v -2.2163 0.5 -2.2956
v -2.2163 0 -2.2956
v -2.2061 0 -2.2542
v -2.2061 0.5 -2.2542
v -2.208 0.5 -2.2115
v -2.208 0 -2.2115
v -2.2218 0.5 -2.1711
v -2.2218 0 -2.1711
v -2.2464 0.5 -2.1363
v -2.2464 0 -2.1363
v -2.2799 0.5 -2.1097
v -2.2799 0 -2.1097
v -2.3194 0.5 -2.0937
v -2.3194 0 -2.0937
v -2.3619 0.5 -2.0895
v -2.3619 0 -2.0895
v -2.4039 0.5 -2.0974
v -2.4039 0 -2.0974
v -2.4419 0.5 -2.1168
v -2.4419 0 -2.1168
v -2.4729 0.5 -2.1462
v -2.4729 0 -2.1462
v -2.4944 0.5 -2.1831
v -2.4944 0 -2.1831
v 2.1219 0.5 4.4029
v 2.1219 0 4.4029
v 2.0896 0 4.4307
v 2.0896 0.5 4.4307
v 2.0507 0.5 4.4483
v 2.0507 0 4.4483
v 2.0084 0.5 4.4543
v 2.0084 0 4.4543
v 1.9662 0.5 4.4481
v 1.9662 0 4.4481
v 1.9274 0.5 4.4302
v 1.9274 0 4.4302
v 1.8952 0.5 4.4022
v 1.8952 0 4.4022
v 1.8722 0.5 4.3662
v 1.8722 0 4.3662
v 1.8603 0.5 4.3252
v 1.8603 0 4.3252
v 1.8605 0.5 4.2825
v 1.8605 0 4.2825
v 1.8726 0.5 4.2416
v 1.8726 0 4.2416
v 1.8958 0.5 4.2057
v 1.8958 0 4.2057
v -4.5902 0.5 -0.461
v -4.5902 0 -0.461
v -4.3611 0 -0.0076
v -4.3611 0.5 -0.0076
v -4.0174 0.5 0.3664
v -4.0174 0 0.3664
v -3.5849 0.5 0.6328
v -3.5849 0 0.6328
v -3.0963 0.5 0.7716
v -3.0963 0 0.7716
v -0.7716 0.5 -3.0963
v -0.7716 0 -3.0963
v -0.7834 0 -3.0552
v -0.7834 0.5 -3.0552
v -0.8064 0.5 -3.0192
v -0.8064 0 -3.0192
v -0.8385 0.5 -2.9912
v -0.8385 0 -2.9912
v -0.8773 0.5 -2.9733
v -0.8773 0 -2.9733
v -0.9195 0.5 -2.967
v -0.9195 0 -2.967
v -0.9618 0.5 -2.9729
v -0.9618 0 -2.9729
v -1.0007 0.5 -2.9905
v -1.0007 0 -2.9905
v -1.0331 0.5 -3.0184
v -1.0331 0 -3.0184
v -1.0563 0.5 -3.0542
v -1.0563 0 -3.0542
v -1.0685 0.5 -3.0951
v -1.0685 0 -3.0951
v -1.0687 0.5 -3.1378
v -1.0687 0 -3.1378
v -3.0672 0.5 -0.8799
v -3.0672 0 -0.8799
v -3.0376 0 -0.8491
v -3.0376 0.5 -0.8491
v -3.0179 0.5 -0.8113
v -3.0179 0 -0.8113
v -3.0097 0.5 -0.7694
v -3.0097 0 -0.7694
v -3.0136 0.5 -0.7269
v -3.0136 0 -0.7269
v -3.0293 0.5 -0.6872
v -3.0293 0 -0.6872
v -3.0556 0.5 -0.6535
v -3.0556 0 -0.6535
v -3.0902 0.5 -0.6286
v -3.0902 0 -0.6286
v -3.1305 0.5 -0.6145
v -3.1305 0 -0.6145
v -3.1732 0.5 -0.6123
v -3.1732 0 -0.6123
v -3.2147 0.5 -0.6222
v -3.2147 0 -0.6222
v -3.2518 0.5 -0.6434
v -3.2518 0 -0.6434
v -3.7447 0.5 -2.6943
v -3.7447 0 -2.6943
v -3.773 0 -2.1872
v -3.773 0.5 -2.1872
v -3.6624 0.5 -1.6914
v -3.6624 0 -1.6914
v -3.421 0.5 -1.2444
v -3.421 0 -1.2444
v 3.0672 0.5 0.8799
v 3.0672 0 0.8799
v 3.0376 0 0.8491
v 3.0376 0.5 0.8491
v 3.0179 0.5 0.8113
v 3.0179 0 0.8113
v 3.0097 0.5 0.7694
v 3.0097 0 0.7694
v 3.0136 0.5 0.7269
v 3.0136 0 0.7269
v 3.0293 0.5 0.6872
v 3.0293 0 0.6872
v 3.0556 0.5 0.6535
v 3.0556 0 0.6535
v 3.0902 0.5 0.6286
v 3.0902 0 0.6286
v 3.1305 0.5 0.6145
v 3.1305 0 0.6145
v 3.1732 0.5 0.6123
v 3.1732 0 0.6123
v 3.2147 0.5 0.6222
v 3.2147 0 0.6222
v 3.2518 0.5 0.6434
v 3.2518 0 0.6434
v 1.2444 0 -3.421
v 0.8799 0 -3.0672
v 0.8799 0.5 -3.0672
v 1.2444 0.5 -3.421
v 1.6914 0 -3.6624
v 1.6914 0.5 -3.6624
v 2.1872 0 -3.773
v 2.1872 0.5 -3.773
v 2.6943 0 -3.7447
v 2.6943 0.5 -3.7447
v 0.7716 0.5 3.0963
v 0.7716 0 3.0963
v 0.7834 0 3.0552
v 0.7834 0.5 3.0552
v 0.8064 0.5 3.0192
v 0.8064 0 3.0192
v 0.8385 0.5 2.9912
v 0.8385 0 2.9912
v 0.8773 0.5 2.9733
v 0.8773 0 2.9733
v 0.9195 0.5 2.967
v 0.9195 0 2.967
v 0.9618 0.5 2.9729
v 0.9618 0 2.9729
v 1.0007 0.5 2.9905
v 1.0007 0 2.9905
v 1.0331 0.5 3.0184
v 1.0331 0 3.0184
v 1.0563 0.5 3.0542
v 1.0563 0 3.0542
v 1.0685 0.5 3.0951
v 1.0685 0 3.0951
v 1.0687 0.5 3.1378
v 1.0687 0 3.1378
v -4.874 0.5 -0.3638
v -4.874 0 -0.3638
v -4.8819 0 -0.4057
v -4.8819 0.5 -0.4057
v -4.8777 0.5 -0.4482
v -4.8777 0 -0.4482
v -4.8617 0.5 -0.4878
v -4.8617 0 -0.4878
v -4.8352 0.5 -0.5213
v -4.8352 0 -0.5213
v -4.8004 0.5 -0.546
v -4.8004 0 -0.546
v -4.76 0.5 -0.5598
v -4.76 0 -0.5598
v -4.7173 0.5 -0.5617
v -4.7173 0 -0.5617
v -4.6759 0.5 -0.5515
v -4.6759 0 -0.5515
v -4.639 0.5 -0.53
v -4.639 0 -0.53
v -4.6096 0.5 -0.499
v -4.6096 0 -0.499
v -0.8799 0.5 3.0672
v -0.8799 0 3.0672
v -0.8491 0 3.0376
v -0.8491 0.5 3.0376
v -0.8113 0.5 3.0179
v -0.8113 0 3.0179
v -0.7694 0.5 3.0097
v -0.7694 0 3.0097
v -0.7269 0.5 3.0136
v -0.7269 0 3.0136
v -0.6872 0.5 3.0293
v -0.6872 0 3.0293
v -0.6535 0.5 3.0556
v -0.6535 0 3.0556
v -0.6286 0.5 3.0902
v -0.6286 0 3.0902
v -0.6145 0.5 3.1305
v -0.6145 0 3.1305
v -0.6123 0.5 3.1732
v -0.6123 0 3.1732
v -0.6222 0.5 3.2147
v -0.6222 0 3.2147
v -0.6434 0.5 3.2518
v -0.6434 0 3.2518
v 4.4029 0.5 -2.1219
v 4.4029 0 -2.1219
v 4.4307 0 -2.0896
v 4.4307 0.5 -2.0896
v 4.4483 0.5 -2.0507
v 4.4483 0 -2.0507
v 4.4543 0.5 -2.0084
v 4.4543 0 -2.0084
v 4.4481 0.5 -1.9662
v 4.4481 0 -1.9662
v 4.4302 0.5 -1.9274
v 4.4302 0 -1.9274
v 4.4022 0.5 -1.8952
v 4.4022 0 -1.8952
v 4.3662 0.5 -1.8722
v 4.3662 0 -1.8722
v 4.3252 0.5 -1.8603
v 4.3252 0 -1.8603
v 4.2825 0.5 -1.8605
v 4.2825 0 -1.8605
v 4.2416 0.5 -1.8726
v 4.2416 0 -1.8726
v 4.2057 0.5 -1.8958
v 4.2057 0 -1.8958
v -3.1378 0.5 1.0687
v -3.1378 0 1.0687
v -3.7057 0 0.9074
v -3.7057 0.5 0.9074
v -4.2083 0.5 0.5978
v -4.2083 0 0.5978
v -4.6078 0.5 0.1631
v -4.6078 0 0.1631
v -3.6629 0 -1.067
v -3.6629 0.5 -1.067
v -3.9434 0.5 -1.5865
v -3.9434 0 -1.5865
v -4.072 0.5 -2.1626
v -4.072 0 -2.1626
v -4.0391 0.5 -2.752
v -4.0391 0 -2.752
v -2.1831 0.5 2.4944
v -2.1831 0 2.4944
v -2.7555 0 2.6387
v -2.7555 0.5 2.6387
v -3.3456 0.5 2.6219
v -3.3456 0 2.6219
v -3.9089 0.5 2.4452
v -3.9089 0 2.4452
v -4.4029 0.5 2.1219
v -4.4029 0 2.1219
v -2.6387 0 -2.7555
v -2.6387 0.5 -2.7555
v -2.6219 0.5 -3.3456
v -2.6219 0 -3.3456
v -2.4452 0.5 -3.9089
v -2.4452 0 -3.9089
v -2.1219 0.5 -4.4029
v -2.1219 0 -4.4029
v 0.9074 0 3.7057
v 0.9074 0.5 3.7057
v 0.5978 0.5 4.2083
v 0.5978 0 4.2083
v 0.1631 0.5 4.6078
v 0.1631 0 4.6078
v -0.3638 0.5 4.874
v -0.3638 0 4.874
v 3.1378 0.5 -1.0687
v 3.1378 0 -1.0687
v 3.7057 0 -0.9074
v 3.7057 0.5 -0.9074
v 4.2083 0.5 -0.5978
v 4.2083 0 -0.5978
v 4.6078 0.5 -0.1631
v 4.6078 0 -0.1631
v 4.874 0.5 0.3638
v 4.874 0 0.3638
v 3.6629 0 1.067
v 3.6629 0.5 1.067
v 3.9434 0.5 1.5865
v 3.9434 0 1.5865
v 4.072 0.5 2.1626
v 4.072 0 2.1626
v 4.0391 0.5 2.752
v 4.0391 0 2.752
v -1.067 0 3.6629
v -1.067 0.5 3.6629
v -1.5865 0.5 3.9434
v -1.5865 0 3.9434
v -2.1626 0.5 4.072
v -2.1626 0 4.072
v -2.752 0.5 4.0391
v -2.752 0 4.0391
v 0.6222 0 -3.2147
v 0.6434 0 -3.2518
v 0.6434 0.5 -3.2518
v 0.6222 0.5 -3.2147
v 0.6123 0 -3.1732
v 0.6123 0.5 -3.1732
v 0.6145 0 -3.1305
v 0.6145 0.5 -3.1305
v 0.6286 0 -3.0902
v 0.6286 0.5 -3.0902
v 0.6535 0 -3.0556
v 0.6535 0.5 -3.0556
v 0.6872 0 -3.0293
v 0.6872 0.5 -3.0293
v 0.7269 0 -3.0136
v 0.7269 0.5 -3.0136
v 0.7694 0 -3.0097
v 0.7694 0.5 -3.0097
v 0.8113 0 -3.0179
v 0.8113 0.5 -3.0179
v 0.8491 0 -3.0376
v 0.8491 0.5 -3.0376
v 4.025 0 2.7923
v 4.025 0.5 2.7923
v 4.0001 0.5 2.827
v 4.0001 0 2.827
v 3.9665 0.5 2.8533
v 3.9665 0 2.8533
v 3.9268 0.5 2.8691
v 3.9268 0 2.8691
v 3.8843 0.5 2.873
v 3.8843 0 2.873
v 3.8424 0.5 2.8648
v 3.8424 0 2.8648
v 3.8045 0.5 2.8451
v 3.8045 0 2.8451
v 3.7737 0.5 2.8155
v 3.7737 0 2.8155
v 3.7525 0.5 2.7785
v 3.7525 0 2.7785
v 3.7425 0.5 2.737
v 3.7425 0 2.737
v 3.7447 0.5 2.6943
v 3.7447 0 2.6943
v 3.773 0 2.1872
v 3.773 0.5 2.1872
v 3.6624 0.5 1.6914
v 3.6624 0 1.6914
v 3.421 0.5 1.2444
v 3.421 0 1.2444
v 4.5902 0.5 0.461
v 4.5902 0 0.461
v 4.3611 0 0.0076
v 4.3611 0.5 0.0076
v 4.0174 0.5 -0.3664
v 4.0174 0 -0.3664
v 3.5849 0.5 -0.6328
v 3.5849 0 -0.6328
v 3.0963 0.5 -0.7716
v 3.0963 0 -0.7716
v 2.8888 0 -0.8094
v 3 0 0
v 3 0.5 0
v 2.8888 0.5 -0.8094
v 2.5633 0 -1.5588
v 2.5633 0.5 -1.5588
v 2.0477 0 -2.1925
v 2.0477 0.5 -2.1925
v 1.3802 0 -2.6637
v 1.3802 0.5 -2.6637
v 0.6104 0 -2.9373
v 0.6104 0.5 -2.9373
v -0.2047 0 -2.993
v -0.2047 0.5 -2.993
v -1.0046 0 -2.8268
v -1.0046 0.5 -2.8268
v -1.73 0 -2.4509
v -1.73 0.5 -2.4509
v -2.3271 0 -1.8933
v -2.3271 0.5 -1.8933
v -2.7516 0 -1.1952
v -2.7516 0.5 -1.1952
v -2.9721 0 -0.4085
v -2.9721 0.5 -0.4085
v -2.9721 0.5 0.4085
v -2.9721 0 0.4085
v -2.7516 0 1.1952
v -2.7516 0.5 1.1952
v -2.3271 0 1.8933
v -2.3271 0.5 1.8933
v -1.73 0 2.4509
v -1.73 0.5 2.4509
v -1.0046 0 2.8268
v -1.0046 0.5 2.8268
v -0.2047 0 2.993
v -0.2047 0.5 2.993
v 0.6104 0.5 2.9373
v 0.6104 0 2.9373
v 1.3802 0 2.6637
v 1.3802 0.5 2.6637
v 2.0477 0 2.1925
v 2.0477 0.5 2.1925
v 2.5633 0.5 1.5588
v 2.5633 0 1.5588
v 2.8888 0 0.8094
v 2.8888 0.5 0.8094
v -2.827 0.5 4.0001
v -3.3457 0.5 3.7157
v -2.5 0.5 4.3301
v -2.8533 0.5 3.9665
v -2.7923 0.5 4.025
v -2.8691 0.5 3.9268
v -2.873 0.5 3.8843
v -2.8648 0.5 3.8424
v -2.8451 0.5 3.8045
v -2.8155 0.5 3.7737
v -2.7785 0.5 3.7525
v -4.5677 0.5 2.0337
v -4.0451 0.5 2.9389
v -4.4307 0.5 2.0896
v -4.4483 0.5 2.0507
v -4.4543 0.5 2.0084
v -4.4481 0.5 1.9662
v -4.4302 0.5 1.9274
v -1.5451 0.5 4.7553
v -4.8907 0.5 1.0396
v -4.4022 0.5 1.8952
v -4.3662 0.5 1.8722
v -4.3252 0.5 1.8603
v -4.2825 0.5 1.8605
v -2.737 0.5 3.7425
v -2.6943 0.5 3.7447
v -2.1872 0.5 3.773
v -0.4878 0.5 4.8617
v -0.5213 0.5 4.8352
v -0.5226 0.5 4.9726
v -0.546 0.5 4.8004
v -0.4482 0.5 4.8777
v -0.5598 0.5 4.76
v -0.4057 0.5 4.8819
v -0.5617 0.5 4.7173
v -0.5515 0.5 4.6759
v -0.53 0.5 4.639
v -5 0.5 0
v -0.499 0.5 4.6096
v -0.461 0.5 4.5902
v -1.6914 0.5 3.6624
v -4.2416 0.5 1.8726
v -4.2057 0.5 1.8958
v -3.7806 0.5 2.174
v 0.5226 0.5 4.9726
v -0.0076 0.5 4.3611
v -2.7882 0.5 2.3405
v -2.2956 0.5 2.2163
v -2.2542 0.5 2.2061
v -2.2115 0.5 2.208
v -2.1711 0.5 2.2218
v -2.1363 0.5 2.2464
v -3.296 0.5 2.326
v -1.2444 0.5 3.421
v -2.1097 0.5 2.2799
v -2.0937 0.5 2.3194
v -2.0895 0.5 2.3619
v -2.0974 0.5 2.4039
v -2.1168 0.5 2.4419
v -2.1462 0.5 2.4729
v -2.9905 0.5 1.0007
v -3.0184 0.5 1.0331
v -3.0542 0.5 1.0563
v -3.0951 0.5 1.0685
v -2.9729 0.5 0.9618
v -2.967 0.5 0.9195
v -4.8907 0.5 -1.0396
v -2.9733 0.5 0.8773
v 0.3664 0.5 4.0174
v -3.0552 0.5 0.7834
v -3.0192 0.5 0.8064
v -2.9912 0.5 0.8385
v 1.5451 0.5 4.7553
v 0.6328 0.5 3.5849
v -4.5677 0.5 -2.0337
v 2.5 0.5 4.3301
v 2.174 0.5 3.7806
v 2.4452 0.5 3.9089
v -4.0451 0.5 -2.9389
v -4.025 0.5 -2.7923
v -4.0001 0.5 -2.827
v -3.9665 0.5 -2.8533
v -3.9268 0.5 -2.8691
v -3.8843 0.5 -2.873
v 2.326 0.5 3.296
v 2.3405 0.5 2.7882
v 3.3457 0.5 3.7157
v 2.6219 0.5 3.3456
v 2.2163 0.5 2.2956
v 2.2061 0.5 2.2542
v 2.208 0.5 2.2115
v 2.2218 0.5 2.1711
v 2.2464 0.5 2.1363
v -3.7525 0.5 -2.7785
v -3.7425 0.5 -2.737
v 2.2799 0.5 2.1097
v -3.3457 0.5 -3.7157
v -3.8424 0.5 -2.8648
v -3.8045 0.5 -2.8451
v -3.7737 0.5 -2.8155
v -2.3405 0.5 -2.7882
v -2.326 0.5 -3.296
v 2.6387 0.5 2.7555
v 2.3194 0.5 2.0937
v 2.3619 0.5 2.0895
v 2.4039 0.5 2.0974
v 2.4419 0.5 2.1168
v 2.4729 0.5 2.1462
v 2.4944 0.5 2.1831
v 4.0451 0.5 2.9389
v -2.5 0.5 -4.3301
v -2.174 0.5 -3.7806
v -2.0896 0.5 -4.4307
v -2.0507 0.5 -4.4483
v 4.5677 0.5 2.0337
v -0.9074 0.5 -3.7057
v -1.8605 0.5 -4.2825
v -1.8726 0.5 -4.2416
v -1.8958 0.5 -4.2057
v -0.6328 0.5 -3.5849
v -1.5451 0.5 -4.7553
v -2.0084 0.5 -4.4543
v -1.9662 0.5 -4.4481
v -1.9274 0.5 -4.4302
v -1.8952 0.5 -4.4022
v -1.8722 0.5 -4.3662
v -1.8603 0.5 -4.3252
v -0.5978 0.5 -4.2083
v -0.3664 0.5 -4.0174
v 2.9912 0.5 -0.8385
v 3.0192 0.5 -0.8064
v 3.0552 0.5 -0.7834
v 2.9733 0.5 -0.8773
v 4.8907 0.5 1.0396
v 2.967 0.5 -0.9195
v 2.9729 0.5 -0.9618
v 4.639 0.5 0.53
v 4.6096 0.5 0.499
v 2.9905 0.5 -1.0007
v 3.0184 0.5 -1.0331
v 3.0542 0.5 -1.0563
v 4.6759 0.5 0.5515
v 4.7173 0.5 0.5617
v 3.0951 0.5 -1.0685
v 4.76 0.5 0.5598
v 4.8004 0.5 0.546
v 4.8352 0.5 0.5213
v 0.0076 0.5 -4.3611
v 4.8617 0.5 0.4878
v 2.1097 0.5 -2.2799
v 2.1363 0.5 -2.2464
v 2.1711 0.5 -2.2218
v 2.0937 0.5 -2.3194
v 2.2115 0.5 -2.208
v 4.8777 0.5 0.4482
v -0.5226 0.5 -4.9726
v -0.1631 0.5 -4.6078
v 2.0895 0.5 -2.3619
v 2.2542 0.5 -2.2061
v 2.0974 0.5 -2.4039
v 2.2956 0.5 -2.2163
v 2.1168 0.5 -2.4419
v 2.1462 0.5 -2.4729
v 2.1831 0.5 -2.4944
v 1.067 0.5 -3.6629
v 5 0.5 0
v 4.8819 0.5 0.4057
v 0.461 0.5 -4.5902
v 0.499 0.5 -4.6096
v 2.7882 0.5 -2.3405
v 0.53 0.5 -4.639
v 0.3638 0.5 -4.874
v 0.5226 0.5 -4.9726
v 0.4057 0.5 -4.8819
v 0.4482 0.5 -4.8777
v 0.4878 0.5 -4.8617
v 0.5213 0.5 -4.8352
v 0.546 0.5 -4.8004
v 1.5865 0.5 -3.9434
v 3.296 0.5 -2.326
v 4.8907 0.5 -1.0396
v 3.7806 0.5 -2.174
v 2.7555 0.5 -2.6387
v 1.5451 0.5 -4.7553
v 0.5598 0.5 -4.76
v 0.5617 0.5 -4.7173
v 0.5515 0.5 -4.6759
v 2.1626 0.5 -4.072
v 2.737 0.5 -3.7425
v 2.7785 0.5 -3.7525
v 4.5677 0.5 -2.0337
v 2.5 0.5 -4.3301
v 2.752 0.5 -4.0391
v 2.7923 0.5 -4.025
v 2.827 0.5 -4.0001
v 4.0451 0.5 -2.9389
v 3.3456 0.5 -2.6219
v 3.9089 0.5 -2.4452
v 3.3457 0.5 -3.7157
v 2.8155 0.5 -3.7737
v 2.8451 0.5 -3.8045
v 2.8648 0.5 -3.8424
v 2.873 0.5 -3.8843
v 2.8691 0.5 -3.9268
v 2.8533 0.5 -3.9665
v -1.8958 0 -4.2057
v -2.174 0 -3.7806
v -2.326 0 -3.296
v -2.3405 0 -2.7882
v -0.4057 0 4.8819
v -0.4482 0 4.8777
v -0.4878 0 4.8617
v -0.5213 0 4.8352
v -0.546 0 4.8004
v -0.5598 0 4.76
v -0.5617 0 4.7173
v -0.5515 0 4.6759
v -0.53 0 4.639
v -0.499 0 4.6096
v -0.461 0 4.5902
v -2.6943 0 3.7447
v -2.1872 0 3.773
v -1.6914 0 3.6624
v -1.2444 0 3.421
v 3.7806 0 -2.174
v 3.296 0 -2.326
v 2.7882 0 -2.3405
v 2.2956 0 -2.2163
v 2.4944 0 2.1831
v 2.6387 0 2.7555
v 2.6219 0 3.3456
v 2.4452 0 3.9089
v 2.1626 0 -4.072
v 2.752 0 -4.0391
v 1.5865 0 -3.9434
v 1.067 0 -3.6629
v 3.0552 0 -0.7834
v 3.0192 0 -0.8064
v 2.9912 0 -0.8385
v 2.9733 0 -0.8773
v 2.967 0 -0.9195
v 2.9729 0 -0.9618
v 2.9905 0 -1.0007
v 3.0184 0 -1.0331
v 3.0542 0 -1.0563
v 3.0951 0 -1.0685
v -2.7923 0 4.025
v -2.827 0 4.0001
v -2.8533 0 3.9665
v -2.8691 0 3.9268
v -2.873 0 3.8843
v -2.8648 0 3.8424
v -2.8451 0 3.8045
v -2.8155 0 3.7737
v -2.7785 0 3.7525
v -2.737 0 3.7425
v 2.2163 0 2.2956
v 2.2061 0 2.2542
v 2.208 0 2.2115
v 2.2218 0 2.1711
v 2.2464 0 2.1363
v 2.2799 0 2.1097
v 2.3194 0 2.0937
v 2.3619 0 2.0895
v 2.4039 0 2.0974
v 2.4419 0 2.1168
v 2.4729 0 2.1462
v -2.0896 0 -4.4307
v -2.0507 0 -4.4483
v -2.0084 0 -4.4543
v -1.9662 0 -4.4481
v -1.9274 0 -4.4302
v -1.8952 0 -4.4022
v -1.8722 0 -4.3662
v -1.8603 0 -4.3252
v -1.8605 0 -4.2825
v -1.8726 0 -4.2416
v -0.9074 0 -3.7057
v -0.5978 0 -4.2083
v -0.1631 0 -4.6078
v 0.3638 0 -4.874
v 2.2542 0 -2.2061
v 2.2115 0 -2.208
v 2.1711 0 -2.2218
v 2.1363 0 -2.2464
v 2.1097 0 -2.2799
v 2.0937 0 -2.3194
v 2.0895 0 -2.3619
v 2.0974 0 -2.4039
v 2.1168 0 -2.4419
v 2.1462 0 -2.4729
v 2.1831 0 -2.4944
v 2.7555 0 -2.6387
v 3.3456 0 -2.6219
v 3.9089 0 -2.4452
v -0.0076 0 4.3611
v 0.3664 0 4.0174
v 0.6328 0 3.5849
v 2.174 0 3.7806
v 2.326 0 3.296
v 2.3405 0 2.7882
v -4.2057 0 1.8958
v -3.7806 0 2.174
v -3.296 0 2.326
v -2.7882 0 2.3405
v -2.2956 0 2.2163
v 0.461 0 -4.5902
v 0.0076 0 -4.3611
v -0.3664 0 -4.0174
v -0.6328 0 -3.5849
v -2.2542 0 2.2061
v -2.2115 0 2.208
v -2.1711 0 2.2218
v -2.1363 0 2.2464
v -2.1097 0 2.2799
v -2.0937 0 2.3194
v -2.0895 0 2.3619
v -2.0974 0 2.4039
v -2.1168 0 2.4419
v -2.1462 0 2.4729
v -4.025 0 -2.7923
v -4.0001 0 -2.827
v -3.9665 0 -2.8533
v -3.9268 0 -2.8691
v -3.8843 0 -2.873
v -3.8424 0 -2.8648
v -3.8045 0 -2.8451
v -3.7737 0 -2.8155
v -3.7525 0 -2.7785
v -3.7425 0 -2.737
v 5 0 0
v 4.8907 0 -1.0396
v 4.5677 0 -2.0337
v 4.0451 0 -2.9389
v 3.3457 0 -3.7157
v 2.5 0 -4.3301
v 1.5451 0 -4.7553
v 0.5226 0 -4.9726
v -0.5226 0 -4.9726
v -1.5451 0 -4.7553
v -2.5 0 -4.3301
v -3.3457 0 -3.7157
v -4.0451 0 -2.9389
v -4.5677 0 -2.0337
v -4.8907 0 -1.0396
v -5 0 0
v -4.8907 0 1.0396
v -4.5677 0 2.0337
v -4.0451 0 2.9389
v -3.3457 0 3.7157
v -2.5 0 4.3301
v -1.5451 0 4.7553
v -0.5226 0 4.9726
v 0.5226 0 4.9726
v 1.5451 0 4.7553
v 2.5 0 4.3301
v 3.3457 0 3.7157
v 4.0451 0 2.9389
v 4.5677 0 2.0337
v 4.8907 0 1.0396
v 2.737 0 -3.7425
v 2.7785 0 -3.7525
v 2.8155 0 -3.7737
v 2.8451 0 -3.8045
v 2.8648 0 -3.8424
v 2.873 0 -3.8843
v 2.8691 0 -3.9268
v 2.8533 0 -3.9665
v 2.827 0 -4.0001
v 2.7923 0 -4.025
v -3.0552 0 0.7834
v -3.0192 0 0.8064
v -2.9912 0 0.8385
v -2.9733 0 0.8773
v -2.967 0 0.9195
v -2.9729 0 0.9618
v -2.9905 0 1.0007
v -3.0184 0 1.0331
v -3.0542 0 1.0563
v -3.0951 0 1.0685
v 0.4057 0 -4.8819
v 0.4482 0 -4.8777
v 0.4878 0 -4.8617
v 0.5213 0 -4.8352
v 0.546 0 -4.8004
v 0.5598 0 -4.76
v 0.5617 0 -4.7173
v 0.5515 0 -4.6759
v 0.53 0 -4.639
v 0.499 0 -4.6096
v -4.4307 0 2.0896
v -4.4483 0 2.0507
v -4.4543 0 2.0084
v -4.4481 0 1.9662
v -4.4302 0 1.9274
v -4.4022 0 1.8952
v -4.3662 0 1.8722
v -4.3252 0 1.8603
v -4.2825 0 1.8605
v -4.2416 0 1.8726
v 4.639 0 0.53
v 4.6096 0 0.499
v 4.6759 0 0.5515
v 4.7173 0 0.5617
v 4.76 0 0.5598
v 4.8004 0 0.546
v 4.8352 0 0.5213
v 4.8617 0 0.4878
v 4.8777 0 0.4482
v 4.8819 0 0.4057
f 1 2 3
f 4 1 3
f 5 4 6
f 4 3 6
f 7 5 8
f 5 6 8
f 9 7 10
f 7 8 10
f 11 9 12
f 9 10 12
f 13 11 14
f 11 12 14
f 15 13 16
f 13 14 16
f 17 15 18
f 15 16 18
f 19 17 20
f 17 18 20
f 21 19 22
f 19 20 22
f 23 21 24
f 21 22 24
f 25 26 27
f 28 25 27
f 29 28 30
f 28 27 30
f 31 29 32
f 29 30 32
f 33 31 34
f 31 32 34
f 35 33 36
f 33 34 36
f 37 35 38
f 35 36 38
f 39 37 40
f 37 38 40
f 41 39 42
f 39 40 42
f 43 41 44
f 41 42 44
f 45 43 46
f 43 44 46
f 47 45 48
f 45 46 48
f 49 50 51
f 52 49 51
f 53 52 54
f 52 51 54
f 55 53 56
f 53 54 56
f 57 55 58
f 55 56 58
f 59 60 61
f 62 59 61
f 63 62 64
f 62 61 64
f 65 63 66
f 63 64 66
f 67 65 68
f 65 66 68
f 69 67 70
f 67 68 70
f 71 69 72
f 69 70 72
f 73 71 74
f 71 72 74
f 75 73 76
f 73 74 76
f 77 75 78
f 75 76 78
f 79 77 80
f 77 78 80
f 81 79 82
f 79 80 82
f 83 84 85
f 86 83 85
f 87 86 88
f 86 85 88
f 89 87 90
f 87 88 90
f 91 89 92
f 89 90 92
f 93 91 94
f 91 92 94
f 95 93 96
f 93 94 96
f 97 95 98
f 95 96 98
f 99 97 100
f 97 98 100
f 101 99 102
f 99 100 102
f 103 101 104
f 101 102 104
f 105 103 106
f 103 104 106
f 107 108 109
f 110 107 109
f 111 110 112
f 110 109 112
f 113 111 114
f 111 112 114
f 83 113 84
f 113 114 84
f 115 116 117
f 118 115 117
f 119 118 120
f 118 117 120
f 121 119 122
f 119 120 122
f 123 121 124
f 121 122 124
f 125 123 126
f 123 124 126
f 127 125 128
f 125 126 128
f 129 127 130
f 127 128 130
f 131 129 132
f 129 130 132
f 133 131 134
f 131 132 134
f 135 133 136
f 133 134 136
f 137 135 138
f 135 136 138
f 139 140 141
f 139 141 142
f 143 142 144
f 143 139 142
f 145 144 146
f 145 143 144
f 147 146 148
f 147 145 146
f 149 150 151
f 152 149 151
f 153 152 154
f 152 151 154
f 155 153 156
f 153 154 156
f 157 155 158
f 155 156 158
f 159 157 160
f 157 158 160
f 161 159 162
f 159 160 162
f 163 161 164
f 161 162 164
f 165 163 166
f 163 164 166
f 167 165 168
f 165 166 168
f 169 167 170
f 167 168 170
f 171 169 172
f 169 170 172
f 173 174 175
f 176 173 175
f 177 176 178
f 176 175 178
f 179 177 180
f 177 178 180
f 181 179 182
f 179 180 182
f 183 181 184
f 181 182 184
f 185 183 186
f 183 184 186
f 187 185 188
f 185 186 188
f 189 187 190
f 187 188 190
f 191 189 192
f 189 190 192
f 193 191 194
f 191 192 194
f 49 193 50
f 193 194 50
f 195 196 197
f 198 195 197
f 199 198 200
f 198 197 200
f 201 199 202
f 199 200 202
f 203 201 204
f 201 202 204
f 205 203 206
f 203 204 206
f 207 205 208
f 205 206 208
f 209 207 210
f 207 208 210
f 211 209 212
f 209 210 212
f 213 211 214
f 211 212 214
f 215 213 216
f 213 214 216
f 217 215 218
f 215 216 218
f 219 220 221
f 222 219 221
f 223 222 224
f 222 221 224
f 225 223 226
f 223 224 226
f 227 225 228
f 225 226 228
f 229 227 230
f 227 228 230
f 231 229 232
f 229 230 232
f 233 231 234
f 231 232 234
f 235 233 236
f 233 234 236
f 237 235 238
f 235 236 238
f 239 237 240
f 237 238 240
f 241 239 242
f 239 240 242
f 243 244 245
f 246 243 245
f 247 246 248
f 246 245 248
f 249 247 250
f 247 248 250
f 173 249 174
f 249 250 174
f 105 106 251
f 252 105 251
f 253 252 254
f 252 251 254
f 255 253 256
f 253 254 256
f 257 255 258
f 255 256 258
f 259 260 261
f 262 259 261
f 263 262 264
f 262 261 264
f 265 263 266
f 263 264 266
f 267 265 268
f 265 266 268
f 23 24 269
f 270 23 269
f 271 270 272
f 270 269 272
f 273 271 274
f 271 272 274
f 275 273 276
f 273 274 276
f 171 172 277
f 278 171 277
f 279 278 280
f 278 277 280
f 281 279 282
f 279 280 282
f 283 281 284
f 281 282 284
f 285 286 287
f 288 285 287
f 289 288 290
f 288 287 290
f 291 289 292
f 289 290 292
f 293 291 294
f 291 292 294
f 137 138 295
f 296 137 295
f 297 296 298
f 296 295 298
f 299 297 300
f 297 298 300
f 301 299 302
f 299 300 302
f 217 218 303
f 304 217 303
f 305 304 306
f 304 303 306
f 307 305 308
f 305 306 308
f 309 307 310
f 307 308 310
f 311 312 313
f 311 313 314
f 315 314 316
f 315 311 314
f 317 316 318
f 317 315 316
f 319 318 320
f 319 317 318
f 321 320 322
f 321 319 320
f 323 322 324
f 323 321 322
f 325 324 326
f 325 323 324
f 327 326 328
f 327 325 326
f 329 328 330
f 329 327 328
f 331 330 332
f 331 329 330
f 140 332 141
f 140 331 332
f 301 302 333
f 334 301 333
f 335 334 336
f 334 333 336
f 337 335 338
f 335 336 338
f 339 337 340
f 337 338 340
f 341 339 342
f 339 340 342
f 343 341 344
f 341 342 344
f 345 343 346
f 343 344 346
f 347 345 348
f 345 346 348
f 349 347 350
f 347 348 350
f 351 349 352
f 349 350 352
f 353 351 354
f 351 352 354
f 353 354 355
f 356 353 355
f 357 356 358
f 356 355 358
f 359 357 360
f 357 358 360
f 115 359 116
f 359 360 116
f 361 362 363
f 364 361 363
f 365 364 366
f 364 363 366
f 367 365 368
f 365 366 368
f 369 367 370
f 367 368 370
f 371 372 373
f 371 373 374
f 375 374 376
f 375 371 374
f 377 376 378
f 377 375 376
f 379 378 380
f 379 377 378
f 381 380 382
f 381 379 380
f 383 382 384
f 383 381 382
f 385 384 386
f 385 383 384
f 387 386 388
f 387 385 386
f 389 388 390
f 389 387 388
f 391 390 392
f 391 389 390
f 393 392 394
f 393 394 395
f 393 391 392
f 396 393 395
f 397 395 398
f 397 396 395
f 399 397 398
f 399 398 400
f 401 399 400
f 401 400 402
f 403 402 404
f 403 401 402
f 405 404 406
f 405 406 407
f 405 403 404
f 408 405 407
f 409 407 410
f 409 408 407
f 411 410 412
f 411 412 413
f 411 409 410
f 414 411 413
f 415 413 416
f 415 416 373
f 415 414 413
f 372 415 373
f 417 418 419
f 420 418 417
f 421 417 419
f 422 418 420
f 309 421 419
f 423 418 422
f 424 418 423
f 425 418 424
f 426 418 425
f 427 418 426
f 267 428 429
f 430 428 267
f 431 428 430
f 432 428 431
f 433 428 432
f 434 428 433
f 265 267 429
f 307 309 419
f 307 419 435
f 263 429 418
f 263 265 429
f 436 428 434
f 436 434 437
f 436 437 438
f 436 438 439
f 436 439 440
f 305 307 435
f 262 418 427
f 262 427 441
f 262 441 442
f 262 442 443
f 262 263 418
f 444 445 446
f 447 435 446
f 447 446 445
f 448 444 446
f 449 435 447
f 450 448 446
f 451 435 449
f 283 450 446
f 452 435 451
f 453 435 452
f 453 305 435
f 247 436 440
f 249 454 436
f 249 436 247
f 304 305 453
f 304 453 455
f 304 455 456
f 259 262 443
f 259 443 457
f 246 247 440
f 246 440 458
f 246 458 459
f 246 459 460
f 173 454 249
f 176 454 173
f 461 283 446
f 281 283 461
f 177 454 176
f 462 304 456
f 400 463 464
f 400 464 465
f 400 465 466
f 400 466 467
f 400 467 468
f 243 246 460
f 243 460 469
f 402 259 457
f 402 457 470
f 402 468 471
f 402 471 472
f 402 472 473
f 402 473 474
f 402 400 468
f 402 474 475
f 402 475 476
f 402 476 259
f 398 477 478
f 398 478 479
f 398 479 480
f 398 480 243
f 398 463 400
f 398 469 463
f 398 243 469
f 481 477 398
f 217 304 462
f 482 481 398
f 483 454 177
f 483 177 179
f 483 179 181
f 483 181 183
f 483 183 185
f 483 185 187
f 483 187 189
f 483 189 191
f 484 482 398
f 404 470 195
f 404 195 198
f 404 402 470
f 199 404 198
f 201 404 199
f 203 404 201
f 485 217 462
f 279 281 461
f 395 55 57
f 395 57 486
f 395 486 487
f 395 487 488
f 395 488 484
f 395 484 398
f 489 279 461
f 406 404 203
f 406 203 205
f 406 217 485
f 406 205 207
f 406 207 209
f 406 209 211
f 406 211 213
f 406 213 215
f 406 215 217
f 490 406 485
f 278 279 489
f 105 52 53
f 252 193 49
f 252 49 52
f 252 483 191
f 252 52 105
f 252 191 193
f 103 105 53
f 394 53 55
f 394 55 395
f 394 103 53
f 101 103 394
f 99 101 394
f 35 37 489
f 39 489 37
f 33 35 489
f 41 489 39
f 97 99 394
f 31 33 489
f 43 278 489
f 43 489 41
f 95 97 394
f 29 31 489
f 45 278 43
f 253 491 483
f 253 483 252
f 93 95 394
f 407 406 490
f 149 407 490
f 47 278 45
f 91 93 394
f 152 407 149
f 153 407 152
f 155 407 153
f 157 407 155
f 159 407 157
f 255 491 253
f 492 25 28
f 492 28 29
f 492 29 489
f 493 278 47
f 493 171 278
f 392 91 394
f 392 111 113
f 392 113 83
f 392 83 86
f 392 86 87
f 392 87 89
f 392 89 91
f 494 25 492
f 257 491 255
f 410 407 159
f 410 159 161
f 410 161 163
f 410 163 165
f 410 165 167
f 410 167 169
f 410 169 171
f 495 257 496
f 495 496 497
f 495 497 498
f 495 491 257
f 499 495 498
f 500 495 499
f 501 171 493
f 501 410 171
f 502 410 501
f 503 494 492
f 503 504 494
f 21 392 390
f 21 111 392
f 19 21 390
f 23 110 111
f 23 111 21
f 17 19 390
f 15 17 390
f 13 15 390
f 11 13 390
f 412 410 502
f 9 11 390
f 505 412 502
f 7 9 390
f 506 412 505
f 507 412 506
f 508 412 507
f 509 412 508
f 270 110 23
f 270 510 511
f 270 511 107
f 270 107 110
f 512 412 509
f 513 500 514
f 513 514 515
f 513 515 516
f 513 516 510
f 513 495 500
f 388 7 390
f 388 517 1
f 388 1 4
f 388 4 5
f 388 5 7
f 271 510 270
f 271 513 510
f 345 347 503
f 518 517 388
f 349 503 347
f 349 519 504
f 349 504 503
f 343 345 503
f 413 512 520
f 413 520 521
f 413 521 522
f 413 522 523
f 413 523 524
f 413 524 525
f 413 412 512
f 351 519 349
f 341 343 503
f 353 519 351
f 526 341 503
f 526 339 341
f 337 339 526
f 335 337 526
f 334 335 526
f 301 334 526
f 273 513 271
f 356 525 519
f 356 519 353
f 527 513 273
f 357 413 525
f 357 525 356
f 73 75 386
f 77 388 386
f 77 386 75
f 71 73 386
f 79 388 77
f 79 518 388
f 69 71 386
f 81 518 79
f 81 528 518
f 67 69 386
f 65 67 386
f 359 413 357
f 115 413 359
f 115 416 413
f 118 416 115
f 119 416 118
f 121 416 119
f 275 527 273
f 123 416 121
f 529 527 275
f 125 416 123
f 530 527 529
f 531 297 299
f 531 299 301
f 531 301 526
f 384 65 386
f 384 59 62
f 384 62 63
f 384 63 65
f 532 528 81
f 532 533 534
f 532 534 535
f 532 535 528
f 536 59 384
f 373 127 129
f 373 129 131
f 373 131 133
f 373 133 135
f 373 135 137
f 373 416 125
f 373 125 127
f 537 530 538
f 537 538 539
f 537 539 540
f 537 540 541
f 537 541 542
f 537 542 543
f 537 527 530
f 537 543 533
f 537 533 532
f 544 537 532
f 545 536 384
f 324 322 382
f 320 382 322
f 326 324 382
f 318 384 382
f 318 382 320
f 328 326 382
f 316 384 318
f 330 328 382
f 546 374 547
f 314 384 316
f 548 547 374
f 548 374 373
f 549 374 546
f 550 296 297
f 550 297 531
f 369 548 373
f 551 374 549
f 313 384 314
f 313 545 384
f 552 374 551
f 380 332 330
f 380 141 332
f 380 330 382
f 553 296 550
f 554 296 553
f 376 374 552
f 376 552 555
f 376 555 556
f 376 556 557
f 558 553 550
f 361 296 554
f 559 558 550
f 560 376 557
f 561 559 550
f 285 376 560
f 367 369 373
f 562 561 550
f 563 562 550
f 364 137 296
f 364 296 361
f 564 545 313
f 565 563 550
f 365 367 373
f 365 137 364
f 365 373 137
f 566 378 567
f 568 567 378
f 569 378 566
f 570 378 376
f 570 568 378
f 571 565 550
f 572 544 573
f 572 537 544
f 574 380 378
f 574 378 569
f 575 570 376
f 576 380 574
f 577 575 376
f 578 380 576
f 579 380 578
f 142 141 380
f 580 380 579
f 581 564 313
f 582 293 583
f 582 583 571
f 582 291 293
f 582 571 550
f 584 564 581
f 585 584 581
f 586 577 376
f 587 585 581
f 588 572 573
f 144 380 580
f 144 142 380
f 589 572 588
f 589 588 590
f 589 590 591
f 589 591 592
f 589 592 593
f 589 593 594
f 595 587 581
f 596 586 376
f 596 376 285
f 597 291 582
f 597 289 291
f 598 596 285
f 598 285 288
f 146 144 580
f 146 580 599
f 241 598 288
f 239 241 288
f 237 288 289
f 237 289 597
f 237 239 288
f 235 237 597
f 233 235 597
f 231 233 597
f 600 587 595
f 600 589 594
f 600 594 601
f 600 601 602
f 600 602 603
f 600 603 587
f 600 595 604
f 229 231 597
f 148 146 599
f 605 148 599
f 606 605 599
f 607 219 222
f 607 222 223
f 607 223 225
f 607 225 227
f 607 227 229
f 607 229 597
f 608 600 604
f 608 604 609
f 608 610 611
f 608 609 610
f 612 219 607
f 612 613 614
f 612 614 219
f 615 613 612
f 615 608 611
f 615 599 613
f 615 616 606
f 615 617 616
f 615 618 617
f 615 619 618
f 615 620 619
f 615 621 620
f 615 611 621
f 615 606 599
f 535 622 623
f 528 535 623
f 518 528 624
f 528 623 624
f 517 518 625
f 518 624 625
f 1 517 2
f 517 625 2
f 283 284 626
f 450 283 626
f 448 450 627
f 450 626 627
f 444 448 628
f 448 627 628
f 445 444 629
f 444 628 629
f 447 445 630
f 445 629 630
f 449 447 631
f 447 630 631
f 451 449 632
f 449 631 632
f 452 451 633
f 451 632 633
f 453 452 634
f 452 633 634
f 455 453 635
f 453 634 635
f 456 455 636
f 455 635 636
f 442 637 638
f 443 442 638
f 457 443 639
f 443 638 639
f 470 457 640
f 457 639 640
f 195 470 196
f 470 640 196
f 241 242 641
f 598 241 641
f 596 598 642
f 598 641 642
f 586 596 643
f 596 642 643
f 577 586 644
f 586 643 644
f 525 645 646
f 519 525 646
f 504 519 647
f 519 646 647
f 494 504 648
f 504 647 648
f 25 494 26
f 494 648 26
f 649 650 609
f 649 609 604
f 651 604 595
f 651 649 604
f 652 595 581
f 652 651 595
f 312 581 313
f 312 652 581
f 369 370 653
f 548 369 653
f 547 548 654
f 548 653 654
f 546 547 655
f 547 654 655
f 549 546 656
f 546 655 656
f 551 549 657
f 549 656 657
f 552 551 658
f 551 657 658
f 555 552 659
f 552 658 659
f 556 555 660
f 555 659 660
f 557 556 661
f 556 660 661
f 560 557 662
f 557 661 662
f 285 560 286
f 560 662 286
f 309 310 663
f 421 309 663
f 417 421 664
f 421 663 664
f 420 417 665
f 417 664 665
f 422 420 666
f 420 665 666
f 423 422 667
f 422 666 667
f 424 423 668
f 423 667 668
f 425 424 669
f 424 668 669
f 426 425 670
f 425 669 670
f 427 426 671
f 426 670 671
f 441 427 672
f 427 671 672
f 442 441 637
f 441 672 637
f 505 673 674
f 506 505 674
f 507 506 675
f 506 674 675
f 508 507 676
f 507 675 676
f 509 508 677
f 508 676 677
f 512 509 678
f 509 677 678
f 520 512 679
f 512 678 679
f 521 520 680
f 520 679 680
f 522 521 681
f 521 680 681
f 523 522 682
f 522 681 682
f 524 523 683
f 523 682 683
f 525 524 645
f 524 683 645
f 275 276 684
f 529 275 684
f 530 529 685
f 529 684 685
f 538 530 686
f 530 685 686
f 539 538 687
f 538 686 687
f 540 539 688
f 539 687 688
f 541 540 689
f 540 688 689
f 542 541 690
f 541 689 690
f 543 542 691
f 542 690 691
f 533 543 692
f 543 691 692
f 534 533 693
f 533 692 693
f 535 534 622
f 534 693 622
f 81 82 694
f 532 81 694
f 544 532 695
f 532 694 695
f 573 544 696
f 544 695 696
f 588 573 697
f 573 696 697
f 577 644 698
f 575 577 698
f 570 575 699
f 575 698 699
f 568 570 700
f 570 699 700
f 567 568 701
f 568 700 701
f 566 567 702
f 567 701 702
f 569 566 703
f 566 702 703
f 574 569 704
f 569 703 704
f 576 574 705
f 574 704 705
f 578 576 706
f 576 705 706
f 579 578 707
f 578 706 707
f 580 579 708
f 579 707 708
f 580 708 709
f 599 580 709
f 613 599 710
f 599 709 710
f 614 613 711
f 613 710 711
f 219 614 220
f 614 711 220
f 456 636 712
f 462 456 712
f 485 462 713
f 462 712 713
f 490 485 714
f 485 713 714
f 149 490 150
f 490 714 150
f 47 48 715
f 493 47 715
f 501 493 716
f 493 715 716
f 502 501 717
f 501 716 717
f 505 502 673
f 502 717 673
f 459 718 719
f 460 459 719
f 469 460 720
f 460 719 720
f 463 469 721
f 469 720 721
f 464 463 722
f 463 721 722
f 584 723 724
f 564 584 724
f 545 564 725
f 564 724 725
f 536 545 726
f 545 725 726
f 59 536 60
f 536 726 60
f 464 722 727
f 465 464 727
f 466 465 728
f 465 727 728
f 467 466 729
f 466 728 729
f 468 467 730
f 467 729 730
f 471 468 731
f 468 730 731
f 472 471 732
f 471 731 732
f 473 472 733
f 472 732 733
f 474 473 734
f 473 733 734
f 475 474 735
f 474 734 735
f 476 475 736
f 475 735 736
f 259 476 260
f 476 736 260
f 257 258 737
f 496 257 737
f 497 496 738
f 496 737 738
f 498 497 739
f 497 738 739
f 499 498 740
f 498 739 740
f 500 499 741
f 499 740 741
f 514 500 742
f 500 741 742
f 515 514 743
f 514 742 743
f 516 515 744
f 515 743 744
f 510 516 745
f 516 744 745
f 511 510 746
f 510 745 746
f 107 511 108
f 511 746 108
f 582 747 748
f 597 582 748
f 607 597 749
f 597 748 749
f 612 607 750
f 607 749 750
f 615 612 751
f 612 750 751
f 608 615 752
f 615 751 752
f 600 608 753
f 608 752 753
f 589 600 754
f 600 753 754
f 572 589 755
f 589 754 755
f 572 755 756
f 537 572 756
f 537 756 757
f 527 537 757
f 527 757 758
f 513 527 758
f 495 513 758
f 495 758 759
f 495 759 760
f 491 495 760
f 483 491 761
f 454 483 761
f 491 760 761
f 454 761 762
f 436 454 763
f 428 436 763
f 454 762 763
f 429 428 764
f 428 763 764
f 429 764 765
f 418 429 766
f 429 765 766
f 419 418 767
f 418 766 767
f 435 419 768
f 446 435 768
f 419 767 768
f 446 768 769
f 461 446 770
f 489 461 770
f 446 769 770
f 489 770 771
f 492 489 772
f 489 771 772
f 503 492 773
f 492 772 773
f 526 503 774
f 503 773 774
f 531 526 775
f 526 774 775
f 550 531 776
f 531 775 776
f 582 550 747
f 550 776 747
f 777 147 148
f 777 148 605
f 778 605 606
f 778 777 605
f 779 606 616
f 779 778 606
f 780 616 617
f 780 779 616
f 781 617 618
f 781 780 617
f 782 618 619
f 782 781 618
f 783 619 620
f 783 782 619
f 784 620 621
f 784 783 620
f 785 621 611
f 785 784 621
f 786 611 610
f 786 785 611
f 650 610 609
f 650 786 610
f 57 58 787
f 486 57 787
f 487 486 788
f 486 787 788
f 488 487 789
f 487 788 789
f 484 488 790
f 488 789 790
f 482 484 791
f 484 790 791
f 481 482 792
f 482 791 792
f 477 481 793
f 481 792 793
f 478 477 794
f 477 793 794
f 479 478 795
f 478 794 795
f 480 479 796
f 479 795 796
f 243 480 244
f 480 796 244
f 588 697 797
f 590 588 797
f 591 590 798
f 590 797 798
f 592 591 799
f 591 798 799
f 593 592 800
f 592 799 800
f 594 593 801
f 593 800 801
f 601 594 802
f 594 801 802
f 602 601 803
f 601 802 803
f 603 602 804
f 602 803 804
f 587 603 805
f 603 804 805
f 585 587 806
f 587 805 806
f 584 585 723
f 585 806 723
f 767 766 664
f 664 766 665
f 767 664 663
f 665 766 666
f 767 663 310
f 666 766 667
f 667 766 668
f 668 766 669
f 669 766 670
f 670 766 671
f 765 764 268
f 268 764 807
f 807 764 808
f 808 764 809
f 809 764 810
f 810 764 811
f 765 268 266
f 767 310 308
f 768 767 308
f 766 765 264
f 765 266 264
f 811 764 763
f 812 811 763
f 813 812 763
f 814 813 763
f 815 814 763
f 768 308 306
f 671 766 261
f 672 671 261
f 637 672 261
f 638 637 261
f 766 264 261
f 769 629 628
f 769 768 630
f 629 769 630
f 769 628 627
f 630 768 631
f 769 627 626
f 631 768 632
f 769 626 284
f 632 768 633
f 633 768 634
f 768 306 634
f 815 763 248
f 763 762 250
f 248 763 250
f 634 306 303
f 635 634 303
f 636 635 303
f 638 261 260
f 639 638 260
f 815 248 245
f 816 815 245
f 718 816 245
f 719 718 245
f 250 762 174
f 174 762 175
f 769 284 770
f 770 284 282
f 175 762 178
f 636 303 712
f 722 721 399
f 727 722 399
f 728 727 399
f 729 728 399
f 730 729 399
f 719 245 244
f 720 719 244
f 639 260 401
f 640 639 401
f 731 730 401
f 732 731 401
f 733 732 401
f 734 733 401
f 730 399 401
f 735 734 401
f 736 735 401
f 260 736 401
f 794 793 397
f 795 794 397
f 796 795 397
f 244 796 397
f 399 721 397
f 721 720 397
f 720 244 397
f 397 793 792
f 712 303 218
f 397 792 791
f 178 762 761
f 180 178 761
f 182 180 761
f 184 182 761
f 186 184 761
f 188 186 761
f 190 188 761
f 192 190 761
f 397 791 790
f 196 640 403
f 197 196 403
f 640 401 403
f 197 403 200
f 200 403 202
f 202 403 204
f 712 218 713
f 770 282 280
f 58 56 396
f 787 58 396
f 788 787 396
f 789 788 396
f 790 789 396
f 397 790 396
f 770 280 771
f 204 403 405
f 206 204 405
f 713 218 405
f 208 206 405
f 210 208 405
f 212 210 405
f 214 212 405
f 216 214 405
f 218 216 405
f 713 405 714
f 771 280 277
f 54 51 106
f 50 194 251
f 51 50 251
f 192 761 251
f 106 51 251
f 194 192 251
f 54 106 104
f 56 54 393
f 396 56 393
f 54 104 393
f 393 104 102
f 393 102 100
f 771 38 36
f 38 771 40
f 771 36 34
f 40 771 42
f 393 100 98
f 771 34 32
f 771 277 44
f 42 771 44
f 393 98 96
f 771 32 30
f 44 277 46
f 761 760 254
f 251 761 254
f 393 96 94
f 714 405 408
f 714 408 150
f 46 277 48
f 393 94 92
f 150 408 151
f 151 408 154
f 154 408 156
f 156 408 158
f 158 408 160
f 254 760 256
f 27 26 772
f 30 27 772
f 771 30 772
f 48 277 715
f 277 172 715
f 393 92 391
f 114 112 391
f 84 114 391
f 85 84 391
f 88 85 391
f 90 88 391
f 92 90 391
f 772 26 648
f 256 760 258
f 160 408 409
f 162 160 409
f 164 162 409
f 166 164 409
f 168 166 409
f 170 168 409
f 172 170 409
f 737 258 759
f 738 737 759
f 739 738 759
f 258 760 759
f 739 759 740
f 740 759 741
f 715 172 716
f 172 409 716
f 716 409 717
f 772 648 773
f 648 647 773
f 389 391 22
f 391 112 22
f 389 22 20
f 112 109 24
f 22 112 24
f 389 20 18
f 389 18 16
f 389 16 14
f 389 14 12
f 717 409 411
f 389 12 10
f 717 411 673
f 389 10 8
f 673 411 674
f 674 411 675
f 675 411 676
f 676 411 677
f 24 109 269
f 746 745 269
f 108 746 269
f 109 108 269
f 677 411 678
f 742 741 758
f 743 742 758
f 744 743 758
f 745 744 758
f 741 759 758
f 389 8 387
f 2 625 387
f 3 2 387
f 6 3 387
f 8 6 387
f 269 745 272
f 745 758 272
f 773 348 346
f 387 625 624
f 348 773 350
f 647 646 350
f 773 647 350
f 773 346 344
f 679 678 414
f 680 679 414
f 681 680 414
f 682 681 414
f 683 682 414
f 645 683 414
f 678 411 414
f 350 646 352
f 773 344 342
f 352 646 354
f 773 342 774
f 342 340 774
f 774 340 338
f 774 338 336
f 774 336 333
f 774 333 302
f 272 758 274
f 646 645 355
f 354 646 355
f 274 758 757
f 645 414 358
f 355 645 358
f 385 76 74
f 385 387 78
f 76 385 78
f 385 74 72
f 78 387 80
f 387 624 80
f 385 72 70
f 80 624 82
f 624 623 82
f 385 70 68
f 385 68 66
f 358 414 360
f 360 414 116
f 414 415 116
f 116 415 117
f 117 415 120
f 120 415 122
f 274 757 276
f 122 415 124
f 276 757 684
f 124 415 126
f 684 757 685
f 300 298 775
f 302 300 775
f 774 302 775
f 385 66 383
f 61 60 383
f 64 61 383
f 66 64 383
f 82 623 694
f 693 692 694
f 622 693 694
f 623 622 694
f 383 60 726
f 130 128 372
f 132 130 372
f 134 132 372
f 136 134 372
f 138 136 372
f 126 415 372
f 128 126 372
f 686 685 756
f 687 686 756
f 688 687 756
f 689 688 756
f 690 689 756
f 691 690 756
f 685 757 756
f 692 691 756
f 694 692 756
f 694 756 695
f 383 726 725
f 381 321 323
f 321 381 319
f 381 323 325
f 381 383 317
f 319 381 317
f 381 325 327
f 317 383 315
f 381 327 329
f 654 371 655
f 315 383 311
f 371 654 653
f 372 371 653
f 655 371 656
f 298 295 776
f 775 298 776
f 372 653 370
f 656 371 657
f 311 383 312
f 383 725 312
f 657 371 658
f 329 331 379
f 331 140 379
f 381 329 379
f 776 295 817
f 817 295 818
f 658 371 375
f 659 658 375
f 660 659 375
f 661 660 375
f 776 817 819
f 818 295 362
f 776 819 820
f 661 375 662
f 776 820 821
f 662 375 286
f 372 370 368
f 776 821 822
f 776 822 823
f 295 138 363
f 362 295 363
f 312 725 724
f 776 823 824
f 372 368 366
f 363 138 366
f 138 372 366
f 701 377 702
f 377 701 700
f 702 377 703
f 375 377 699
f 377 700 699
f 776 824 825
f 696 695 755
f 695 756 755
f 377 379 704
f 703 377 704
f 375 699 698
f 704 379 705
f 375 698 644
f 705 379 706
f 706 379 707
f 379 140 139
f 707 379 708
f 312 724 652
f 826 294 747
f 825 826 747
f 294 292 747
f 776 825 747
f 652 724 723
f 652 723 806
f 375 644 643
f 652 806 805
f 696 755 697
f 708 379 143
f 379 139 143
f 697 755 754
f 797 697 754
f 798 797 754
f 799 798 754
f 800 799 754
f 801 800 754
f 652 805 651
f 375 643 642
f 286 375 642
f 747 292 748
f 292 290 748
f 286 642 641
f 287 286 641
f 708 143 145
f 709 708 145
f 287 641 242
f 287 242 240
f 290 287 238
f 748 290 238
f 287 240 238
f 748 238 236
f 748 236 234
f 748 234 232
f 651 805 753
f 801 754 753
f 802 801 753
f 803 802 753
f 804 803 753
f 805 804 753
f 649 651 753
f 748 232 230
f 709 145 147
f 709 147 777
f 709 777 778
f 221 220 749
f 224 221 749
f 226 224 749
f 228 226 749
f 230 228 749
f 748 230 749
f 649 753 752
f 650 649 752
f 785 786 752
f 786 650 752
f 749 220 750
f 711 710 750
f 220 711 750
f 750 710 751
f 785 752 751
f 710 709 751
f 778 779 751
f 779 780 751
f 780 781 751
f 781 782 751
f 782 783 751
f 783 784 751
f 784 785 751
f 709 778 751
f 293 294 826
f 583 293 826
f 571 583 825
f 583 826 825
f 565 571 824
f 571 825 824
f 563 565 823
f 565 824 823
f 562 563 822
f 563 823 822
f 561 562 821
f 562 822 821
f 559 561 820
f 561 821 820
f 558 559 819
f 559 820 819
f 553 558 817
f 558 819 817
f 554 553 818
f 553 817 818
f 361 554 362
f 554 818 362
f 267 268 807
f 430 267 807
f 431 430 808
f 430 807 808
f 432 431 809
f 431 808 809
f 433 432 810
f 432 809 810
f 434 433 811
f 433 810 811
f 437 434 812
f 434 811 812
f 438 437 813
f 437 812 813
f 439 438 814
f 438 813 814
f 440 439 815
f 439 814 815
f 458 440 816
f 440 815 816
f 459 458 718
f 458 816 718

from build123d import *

# Parameters (mm, degrees)
SKETCH1_R           = 5
SKETCH1_R_2         = 3
BOSS_EXTRUDE1_DEPTH = 0.5
CUT_EXTRUDE2_DEPTH  = 0.5
CUT_EXTRUDE3_DEPTH  = 0.5
CUT_EXTRUDE5_DEPTH  = 0.5


with BuildPart() as part:
    # Sketch1 → Boss-Extrude1 (new body)
    with BuildSketch(Plane(origin=(0, 0, 0), x_dir=(1, 0, 0), z_dir=(0, 1, 0))):
        Circle(SKETCH1_R)
        Circle(SKETCH1_R_2, mode=Mode.SUBTRACT)
    extrude(amount=BOSS_EXTRUDE1_DEPTH)

    # Sketch1<4> → Cut-Extrude2 (cut)
    with BuildSketch(Plane(origin=(0, 0, 0), x_dir=(1, 0, 0), z_dir=(0, 1, 0))):
        with BuildLine():
            ThreePointArc((-3.744681424, 2.694339182), (-3.662355303, 1.691396556), (-3.06721905, 0.879926074))
            ThreePointArc((-3.06721905, 0.879926074), (-3.041225351, 0.669392639), (-3.251758787, 0.64339894))
            ThreePointArc((-3.251758787, 0.64339894), (-3.943403621, 1.586459229), (-4.039079925, 2.7520412))
            ThreePointArc((-4.039079925, 2.7520412), (-3.863029666, 2.870389441), (-3.744681424, 2.694339182))
        make_face()
    extrude(amount=CUT_EXTRUDE2_DEPTH, mode=Mode.SUBTRACT)

    # Sketch1<6> → Cut-Extrude3 (cut)
    with BuildSketch(Plane(origin=(0, 0, 0), x_dir=(1, 0, 0), z_dir=(0, 1, 0))):
        with BuildLine():
            ThreePointArc((2.7520412, 4.039079925), (1.586459229, 3.943403621), (0.64339894, 3.251758787))
            ThreePointArc((0.64339894, 3.251758787), (0.669392639, 3.041225351), (0.879926074, 3.06721905))
            ThreePointArc((0.879926074, 3.06721905), (1.691396556, 3.662355303), (2.694339182, 3.744681424))
            ThreePointArc((2.694339182, 3.744681424), (2.870389441, 3.863029666), (2.7520412, 4.039079925))
        make_face()
        with BuildLine():
            ThreePointArc((-1.895819652, 4.20570689), (-2.325994452, 3.295970036), (-2.216326579, 2.295647859))
            ThreePointArc((-2.216326579, 2.295647859), (-2.299082093, 2.100323706), (-2.494406247, 2.18307922))
            ThreePointArc((-2.494406247, 2.18307922), (-2.621858099, 3.345615805), (-2.121925223, 4.402877554))
            ThreePointArc((-2.121925223, 4.402877554), (-1.910287106, 4.417345007), (-1.895819652, 4.20570689))
        make_face()
        with BuildLine():
            ThreePointArc((0.461025466, 4.590158833), (-0.366385266, 4.017391008), (-0.771571191, 3.096252653))
            ThreePointArc((-0.771571191, 3.096252653), (-0.940901645, 2.968474732), (-1.068679567, 3.137805186))
            ThreePointArc((-1.068679567, 3.137805186), (-0.597787817, 4.208317328), (0.363797629, 4.873966423))
            ThreePointArc((0.363797629, 4.873966423), (0.554315342, 4.780676547), (0.461025466, 4.590158833))
        make_face()
    extrude(amount=CUT_EXTRUDE3_DEPTH, mode=Mode.SUBTRACT)

    # Sketch1<7> → Cut-Extrude5 (cut)
    with BuildSketch(Plane(origin=(0, 0, 0), x_dir=(1, 0, 0), z_dir=(0, 1, 0))):
        with BuildLine():
            ThreePointArc((4.20570689, 1.895819652), (3.295970036, 2.325994452), (2.295647859, 2.216326579))
            ThreePointArc((2.295647859, 2.216326579), (2.100323706, 2.299082093), (2.18307922, 2.494406247))
            ThreePointArc((2.18307922, 2.494406247), (3.345615805, 2.621858099), (4.402877554, 2.121925223))
            ThreePointArc((4.402877554, 2.121925223), (4.417345007, 1.910287106), (4.20570689, 1.895819652))
        make_face()
        with BuildLine():
            ThreePointArc((4.590158833, -0.461025466), (4.017391008, 0.366385266), (3.096252653, 0.771571191))
            ThreePointArc((3.096252653, 0.771571191), (2.968474732, 0.940901645), (3.137805186, 1.068679567))
            ThreePointArc((3.137805186, 1.068679567), (4.208317328, 0.597787817), (4.873966423, -0.363797629))
            ThreePointArc((4.873966423, -0.363797629), (4.780676547, -0.554315342), (4.590158833, -0.461025466))
        make_face()
        with BuildLine():
            ThreePointArc((3.744681424, -2.694339182), (3.662355303, -1.691396556), (3.06721905, -0.879926074))
            ThreePointArc((3.06721905, -0.879926074), (3.041225351, -0.669392639), (3.251758787, -0.64339894))
            ThreePointArc((3.251758787, -0.64339894), (3.943403621, -1.586459229), (4.039079925, -2.7520412))
            ThreePointArc((4.039079925, -2.7520412), (3.863029666, -2.870389441), (3.744681424, -2.694339182))
        make_face()
        with BuildLine():
            ThreePointArc((1.895819652, -4.20570689), (2.325994452, -3.295970036), (2.216326579, -2.295647859))
            ThreePointArc((2.216326579, -2.295647859), (2.299082093, -2.100323706), (2.494406247, -2.18307922))
            ThreePointArc((2.494406247, -2.18307922), (2.621858099, -3.345615805), (2.121925223, -4.402877554))
            ThreePointArc((2.121925223, -4.402877554), (1.910287106, -4.417345007), (1.895819652, -4.20570689))
        make_face()
        with BuildLine():
            ThreePointArc((-0.461025466, -4.590158833), (0.366385266, -4.017391008), (0.771571191, -3.096252653))
            ThreePointArc((0.771571191, -3.096252653), (0.940901645, -2.968474732), (1.068679567, -3.137805186))
            ThreePointArc((1.068679567, -3.137805186), (0.597787817, -4.208317328), (-0.363797629, -4.873966423))
            ThreePointArc((-0.363797629, -4.873966423), (-0.554315342, -4.780676547), (-0.461025466, -4.590158833))
        make_face()
        with BuildLine():
            ThreePointArc((-2.694339182, -3.744681424), (-1.691396556, -3.662355303), (-0.879926074, -3.06721905))
            ThreePointArc((-0.879926074, -3.06721905), (-0.669392639, -3.041225351), (-0.64339894, -3.251758787))
            ThreePointArc((-0.64339894, -3.251758787), (-1.586459229, -3.943403621), (-2.7520412, -4.039079925))
            ThreePointArc((-2.7520412, -4.039079925), (-2.870389441, -3.863029666), (-2.694339182, -3.744681424))
        make_face()
        with BuildLine():
            ThreePointArc((-4.20570689, -1.895819652), (-3.295970036, -2.325994452), (-2.295647859, -2.216326579))
            ThreePointArc((-2.295647859, -2.216326579), (-2.100323706, -2.299082093), (-2.18307922, -2.494406247))
            ThreePointArc((-2.18307922, -2.494406247), (-3.345615805, -2.621858099), (-4.402877554, -2.121925223))
            ThreePointArc((-4.402877554, -2.121925223), (-4.417345007, -1.910287106), (-4.20570689, -1.895819652))
        make_face()
        with BuildLine():
            ThreePointArc((-4.590158833, 0.461025466), (-4.017391008, -0.366385266), (-3.096252653, -0.771571191))
            ThreePointArc((-3.096252653, -0.771571191), (-2.968474732, -0.940901645), (-3.137805186, -1.068679567))
            ThreePointArc((-3.137805186, -1.068679567), (-4.208317328, -0.597787817), (-4.873966423, 0.363797629))
            ThreePointArc((-4.873966423, 0.363797629), (-4.780676547, 0.554315342), (-4.590158833, 0.461025466))
        make_face()
    extrude(amount=CUT_EXTRUDE5_DEPTH, mode=Mode.SUBTRACT)


solid = part.part
